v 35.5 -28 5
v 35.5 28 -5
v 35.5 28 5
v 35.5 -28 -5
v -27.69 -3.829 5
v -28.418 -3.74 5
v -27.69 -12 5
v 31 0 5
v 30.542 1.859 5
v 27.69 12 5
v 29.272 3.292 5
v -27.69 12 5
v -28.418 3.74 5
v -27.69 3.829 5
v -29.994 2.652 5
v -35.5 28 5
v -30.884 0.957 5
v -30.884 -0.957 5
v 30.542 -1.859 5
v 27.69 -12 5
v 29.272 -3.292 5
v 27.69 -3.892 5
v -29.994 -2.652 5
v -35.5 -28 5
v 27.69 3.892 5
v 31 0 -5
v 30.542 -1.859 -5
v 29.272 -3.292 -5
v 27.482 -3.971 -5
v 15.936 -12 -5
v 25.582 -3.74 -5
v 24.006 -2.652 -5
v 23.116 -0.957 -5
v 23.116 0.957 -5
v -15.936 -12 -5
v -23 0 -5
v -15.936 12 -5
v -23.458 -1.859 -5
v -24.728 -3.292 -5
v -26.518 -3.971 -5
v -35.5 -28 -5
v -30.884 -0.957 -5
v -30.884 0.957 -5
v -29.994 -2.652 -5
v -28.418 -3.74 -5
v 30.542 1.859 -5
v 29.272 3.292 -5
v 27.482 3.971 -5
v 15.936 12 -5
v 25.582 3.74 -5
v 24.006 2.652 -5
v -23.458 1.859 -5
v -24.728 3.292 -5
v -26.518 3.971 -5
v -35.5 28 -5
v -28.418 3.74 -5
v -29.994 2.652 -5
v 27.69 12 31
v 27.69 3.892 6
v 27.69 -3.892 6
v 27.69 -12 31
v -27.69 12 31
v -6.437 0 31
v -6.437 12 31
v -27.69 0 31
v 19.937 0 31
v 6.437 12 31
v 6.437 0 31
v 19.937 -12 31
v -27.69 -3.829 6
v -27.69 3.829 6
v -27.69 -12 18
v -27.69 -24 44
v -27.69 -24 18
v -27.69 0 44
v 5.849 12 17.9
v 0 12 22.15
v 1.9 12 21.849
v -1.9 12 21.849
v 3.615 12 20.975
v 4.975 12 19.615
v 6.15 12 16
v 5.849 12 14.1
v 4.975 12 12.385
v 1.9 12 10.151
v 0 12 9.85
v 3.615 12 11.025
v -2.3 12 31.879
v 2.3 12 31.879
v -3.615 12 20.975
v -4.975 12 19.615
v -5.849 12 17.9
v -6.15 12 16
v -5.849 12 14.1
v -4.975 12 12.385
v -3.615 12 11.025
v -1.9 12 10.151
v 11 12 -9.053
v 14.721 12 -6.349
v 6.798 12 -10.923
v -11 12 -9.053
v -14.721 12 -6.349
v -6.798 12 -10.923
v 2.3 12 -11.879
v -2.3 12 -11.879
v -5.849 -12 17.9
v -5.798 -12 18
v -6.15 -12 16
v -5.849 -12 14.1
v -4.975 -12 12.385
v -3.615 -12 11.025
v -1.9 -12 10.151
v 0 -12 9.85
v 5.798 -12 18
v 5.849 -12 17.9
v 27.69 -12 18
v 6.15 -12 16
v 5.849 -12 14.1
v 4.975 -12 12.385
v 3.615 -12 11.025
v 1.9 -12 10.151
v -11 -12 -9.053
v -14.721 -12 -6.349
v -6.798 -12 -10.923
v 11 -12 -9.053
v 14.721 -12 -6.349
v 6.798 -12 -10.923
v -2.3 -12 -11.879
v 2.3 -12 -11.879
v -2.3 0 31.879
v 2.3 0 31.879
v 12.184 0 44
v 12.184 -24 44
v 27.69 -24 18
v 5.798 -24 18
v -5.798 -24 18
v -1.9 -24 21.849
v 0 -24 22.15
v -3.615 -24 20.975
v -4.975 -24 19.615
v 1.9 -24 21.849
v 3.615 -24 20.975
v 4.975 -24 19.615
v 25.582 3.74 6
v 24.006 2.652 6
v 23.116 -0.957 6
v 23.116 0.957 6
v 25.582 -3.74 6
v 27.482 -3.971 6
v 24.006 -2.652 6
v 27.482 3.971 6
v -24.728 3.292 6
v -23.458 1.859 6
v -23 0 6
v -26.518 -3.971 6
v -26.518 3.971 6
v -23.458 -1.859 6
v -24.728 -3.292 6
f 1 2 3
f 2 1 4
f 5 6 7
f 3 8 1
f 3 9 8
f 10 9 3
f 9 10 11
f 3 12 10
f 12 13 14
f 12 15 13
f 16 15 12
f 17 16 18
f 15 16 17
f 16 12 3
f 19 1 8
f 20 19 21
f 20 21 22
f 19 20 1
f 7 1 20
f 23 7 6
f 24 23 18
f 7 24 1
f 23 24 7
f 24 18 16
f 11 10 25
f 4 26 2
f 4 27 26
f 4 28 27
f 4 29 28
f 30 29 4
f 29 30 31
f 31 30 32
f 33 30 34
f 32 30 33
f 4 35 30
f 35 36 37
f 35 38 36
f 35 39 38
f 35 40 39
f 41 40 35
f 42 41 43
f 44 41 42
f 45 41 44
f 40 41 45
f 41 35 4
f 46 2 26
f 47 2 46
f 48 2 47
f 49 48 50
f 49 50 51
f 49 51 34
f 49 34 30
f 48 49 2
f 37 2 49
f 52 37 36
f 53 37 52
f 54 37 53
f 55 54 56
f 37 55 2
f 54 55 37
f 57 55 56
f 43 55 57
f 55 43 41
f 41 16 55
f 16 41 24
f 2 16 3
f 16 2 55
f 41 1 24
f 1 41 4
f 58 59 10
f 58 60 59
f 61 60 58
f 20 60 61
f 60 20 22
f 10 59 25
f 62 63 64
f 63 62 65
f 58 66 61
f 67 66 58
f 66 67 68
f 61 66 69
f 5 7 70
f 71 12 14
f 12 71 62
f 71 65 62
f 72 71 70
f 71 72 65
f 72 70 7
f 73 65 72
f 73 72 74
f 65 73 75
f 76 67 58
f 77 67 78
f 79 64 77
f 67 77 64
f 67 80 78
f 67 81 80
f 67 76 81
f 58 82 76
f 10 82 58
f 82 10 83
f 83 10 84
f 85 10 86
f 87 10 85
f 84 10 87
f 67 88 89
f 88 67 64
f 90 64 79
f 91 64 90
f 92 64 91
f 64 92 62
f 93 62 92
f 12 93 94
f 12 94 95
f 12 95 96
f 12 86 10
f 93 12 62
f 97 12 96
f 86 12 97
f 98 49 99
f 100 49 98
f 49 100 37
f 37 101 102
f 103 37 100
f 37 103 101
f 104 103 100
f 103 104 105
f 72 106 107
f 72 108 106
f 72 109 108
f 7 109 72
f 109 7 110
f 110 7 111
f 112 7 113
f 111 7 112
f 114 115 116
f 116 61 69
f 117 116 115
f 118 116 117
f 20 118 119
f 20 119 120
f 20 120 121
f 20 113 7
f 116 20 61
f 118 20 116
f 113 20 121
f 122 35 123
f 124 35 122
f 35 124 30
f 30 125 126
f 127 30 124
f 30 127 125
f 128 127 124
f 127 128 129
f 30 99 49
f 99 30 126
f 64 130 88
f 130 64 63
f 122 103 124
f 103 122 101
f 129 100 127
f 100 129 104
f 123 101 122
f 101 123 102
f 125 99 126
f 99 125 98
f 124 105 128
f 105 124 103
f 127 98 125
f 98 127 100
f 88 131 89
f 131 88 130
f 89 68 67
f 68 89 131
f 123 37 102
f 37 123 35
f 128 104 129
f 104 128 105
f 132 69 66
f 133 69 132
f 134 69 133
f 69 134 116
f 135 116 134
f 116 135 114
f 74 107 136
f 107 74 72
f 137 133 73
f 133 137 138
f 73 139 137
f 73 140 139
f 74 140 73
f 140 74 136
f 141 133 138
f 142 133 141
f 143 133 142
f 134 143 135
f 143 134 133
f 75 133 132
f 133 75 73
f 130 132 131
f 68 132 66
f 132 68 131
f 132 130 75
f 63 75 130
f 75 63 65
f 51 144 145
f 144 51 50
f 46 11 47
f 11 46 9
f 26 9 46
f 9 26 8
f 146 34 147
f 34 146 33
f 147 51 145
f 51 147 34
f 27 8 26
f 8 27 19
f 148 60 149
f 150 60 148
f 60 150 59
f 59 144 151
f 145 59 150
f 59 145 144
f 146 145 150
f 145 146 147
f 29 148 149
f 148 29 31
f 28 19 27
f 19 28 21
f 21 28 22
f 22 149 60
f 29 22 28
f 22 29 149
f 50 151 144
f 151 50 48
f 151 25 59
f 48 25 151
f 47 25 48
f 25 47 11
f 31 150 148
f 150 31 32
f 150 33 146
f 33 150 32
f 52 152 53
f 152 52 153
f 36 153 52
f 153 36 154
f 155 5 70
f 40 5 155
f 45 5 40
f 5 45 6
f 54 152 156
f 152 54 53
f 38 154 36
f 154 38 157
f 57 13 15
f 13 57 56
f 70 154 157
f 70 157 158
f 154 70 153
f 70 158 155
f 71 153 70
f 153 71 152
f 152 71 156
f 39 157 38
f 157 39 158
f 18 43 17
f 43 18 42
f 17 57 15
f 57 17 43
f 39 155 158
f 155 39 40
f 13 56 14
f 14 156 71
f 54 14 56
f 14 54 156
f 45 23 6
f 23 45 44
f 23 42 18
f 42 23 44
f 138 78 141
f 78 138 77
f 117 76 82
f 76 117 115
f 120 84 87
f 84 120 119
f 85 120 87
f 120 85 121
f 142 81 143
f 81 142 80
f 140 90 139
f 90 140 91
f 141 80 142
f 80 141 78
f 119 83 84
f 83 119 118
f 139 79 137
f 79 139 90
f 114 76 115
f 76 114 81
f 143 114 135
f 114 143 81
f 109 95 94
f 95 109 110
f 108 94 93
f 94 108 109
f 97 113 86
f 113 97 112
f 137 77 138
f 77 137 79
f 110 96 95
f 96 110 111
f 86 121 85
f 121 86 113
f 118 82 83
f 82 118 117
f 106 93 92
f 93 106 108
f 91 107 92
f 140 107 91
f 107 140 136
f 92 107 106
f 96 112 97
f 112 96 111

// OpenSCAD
// Parameters
shaft_diameter_mm = 12; //[6:24:0.5]
base_length_mm = 71; //[35.5:142:0.5]
base_width_mm = 56; //[28:112:0.5]
base_thickness_mm = 10; //[5:20:0.5]
overall_height_mm = 36; //[18:72:0.5]
mount_hole_diameter_mm = 8; //[4:16:0.5]
mount_hole_spacing_mm = 54; //[27:108:0.5]
bearing_outer_diameter_mm = 32; //[16:64:0.5]
bearing_width_mm = 12; //[6:24:0.5]
housing_wall_thickness_mm = 6; //[3:12:0.5]
fillet_radius_mm = 3; //[1:6:0.5]
overlap_mm = 1; //[0.5:2:0.1]
clearance_mm = 0.3; //[0.1:0.8:0.05]

// Right Trapezoid
module right_trapezoid() {
  color("Silver") {
    linear_extrude(height=bearing_width_mm + 2*housing_wall_thickness_mm) {
      polygon(points=[
        [0, 0],
        [base_length_mm*0.78, 0],
        [base_length_mm*0.78*0.72, overall_height_mm - base_thickness_mm],
        [0, overall_height_mm - base_thickness_mm]
      ]);
    }
  }
}

// KP Pillow Block Hole Positions
module kp_pillow_block_hole_positions() {
  color("Black") {
    union() {
      translate([mount_hole_spacing_mm/2, 0, 0])
        cylinder(r=mount_hole_diameter_mm/2, h=base_thickness_mm + 2*overlap_mm, center=true);
      translate([-mount_hole_spacing_mm/2, 0, 0])
        cylinder(r=mount_hole_diameter_mm/2, h=base_thickness_mm + 2*overlap_mm, center=true);
    }
  }
}

// KP Pillow Block Assembly
module kp_pillow_block_assembly() {
  color("DimGray") {
    difference() {
      union() {
        translate([0, 0, 0])
          cube([base_length_mm, base_width_mm, base_thickness_mm], center=true);
        translate([0, 0, base_thickness_mm/2 + (overall_height_mm - base_thickness_mm + overlap_mm)/2 - overlap_mm])
          cube([base_length_mm*0.78, bearing_width_mm + 2*housing_wall_thickness_mm, overall_height_mm - base_thickness_mm + overlap_mm], center=true);
        translate([0, 0, base_thickness_mm/2 + (overall_height_mm - base_thickness_mm) - (bearing_outer_diameter_mm/2 + housing_wall_thickness_mm) + overlap_mm])
          rotate([90, 0, 0])
          cylinder(r=bearing_outer_diameter_mm/2 + housing_wall_thickness_mm, h=bearing_width_mm + 2*housing_wall_thickness_mm, center=true);
        translate([(-base_length_mm*0.78)/2, 0, base_thickness_mm/2 + (overall_height_mm - base_thickness_mm)/2])
          rotate([90, 0, 0])
          right_trapezoid();
      }
      translate([0, 0, base_thickness_mm/2 + (overall_height_mm - base_thickness_mm) - (bearing_outer_diameter_mm/2) + overlap_mm])
        rotate([90, 0, 0])
        cylinder(r=(shaft_diameter_mm + clearance_mm)/2, h=base_width_mm + 2*overlap_mm, center=true);
      kp_pillow_block_hole_positions();
    }
  }
}

// SBR Bearing Block Assembly
module sbr_bearing_block_assembly() {
  color("Silver") {
    kp_pillow_block_assembly();
  }
}

// SCS Bearing Block
module scs_bearing_block() {
  color("Silver") {
    sbr_bearing_block_assembly();
  }
}

// Assembly
module assembly() {
  scs_bearing_block();
}

assembly();
